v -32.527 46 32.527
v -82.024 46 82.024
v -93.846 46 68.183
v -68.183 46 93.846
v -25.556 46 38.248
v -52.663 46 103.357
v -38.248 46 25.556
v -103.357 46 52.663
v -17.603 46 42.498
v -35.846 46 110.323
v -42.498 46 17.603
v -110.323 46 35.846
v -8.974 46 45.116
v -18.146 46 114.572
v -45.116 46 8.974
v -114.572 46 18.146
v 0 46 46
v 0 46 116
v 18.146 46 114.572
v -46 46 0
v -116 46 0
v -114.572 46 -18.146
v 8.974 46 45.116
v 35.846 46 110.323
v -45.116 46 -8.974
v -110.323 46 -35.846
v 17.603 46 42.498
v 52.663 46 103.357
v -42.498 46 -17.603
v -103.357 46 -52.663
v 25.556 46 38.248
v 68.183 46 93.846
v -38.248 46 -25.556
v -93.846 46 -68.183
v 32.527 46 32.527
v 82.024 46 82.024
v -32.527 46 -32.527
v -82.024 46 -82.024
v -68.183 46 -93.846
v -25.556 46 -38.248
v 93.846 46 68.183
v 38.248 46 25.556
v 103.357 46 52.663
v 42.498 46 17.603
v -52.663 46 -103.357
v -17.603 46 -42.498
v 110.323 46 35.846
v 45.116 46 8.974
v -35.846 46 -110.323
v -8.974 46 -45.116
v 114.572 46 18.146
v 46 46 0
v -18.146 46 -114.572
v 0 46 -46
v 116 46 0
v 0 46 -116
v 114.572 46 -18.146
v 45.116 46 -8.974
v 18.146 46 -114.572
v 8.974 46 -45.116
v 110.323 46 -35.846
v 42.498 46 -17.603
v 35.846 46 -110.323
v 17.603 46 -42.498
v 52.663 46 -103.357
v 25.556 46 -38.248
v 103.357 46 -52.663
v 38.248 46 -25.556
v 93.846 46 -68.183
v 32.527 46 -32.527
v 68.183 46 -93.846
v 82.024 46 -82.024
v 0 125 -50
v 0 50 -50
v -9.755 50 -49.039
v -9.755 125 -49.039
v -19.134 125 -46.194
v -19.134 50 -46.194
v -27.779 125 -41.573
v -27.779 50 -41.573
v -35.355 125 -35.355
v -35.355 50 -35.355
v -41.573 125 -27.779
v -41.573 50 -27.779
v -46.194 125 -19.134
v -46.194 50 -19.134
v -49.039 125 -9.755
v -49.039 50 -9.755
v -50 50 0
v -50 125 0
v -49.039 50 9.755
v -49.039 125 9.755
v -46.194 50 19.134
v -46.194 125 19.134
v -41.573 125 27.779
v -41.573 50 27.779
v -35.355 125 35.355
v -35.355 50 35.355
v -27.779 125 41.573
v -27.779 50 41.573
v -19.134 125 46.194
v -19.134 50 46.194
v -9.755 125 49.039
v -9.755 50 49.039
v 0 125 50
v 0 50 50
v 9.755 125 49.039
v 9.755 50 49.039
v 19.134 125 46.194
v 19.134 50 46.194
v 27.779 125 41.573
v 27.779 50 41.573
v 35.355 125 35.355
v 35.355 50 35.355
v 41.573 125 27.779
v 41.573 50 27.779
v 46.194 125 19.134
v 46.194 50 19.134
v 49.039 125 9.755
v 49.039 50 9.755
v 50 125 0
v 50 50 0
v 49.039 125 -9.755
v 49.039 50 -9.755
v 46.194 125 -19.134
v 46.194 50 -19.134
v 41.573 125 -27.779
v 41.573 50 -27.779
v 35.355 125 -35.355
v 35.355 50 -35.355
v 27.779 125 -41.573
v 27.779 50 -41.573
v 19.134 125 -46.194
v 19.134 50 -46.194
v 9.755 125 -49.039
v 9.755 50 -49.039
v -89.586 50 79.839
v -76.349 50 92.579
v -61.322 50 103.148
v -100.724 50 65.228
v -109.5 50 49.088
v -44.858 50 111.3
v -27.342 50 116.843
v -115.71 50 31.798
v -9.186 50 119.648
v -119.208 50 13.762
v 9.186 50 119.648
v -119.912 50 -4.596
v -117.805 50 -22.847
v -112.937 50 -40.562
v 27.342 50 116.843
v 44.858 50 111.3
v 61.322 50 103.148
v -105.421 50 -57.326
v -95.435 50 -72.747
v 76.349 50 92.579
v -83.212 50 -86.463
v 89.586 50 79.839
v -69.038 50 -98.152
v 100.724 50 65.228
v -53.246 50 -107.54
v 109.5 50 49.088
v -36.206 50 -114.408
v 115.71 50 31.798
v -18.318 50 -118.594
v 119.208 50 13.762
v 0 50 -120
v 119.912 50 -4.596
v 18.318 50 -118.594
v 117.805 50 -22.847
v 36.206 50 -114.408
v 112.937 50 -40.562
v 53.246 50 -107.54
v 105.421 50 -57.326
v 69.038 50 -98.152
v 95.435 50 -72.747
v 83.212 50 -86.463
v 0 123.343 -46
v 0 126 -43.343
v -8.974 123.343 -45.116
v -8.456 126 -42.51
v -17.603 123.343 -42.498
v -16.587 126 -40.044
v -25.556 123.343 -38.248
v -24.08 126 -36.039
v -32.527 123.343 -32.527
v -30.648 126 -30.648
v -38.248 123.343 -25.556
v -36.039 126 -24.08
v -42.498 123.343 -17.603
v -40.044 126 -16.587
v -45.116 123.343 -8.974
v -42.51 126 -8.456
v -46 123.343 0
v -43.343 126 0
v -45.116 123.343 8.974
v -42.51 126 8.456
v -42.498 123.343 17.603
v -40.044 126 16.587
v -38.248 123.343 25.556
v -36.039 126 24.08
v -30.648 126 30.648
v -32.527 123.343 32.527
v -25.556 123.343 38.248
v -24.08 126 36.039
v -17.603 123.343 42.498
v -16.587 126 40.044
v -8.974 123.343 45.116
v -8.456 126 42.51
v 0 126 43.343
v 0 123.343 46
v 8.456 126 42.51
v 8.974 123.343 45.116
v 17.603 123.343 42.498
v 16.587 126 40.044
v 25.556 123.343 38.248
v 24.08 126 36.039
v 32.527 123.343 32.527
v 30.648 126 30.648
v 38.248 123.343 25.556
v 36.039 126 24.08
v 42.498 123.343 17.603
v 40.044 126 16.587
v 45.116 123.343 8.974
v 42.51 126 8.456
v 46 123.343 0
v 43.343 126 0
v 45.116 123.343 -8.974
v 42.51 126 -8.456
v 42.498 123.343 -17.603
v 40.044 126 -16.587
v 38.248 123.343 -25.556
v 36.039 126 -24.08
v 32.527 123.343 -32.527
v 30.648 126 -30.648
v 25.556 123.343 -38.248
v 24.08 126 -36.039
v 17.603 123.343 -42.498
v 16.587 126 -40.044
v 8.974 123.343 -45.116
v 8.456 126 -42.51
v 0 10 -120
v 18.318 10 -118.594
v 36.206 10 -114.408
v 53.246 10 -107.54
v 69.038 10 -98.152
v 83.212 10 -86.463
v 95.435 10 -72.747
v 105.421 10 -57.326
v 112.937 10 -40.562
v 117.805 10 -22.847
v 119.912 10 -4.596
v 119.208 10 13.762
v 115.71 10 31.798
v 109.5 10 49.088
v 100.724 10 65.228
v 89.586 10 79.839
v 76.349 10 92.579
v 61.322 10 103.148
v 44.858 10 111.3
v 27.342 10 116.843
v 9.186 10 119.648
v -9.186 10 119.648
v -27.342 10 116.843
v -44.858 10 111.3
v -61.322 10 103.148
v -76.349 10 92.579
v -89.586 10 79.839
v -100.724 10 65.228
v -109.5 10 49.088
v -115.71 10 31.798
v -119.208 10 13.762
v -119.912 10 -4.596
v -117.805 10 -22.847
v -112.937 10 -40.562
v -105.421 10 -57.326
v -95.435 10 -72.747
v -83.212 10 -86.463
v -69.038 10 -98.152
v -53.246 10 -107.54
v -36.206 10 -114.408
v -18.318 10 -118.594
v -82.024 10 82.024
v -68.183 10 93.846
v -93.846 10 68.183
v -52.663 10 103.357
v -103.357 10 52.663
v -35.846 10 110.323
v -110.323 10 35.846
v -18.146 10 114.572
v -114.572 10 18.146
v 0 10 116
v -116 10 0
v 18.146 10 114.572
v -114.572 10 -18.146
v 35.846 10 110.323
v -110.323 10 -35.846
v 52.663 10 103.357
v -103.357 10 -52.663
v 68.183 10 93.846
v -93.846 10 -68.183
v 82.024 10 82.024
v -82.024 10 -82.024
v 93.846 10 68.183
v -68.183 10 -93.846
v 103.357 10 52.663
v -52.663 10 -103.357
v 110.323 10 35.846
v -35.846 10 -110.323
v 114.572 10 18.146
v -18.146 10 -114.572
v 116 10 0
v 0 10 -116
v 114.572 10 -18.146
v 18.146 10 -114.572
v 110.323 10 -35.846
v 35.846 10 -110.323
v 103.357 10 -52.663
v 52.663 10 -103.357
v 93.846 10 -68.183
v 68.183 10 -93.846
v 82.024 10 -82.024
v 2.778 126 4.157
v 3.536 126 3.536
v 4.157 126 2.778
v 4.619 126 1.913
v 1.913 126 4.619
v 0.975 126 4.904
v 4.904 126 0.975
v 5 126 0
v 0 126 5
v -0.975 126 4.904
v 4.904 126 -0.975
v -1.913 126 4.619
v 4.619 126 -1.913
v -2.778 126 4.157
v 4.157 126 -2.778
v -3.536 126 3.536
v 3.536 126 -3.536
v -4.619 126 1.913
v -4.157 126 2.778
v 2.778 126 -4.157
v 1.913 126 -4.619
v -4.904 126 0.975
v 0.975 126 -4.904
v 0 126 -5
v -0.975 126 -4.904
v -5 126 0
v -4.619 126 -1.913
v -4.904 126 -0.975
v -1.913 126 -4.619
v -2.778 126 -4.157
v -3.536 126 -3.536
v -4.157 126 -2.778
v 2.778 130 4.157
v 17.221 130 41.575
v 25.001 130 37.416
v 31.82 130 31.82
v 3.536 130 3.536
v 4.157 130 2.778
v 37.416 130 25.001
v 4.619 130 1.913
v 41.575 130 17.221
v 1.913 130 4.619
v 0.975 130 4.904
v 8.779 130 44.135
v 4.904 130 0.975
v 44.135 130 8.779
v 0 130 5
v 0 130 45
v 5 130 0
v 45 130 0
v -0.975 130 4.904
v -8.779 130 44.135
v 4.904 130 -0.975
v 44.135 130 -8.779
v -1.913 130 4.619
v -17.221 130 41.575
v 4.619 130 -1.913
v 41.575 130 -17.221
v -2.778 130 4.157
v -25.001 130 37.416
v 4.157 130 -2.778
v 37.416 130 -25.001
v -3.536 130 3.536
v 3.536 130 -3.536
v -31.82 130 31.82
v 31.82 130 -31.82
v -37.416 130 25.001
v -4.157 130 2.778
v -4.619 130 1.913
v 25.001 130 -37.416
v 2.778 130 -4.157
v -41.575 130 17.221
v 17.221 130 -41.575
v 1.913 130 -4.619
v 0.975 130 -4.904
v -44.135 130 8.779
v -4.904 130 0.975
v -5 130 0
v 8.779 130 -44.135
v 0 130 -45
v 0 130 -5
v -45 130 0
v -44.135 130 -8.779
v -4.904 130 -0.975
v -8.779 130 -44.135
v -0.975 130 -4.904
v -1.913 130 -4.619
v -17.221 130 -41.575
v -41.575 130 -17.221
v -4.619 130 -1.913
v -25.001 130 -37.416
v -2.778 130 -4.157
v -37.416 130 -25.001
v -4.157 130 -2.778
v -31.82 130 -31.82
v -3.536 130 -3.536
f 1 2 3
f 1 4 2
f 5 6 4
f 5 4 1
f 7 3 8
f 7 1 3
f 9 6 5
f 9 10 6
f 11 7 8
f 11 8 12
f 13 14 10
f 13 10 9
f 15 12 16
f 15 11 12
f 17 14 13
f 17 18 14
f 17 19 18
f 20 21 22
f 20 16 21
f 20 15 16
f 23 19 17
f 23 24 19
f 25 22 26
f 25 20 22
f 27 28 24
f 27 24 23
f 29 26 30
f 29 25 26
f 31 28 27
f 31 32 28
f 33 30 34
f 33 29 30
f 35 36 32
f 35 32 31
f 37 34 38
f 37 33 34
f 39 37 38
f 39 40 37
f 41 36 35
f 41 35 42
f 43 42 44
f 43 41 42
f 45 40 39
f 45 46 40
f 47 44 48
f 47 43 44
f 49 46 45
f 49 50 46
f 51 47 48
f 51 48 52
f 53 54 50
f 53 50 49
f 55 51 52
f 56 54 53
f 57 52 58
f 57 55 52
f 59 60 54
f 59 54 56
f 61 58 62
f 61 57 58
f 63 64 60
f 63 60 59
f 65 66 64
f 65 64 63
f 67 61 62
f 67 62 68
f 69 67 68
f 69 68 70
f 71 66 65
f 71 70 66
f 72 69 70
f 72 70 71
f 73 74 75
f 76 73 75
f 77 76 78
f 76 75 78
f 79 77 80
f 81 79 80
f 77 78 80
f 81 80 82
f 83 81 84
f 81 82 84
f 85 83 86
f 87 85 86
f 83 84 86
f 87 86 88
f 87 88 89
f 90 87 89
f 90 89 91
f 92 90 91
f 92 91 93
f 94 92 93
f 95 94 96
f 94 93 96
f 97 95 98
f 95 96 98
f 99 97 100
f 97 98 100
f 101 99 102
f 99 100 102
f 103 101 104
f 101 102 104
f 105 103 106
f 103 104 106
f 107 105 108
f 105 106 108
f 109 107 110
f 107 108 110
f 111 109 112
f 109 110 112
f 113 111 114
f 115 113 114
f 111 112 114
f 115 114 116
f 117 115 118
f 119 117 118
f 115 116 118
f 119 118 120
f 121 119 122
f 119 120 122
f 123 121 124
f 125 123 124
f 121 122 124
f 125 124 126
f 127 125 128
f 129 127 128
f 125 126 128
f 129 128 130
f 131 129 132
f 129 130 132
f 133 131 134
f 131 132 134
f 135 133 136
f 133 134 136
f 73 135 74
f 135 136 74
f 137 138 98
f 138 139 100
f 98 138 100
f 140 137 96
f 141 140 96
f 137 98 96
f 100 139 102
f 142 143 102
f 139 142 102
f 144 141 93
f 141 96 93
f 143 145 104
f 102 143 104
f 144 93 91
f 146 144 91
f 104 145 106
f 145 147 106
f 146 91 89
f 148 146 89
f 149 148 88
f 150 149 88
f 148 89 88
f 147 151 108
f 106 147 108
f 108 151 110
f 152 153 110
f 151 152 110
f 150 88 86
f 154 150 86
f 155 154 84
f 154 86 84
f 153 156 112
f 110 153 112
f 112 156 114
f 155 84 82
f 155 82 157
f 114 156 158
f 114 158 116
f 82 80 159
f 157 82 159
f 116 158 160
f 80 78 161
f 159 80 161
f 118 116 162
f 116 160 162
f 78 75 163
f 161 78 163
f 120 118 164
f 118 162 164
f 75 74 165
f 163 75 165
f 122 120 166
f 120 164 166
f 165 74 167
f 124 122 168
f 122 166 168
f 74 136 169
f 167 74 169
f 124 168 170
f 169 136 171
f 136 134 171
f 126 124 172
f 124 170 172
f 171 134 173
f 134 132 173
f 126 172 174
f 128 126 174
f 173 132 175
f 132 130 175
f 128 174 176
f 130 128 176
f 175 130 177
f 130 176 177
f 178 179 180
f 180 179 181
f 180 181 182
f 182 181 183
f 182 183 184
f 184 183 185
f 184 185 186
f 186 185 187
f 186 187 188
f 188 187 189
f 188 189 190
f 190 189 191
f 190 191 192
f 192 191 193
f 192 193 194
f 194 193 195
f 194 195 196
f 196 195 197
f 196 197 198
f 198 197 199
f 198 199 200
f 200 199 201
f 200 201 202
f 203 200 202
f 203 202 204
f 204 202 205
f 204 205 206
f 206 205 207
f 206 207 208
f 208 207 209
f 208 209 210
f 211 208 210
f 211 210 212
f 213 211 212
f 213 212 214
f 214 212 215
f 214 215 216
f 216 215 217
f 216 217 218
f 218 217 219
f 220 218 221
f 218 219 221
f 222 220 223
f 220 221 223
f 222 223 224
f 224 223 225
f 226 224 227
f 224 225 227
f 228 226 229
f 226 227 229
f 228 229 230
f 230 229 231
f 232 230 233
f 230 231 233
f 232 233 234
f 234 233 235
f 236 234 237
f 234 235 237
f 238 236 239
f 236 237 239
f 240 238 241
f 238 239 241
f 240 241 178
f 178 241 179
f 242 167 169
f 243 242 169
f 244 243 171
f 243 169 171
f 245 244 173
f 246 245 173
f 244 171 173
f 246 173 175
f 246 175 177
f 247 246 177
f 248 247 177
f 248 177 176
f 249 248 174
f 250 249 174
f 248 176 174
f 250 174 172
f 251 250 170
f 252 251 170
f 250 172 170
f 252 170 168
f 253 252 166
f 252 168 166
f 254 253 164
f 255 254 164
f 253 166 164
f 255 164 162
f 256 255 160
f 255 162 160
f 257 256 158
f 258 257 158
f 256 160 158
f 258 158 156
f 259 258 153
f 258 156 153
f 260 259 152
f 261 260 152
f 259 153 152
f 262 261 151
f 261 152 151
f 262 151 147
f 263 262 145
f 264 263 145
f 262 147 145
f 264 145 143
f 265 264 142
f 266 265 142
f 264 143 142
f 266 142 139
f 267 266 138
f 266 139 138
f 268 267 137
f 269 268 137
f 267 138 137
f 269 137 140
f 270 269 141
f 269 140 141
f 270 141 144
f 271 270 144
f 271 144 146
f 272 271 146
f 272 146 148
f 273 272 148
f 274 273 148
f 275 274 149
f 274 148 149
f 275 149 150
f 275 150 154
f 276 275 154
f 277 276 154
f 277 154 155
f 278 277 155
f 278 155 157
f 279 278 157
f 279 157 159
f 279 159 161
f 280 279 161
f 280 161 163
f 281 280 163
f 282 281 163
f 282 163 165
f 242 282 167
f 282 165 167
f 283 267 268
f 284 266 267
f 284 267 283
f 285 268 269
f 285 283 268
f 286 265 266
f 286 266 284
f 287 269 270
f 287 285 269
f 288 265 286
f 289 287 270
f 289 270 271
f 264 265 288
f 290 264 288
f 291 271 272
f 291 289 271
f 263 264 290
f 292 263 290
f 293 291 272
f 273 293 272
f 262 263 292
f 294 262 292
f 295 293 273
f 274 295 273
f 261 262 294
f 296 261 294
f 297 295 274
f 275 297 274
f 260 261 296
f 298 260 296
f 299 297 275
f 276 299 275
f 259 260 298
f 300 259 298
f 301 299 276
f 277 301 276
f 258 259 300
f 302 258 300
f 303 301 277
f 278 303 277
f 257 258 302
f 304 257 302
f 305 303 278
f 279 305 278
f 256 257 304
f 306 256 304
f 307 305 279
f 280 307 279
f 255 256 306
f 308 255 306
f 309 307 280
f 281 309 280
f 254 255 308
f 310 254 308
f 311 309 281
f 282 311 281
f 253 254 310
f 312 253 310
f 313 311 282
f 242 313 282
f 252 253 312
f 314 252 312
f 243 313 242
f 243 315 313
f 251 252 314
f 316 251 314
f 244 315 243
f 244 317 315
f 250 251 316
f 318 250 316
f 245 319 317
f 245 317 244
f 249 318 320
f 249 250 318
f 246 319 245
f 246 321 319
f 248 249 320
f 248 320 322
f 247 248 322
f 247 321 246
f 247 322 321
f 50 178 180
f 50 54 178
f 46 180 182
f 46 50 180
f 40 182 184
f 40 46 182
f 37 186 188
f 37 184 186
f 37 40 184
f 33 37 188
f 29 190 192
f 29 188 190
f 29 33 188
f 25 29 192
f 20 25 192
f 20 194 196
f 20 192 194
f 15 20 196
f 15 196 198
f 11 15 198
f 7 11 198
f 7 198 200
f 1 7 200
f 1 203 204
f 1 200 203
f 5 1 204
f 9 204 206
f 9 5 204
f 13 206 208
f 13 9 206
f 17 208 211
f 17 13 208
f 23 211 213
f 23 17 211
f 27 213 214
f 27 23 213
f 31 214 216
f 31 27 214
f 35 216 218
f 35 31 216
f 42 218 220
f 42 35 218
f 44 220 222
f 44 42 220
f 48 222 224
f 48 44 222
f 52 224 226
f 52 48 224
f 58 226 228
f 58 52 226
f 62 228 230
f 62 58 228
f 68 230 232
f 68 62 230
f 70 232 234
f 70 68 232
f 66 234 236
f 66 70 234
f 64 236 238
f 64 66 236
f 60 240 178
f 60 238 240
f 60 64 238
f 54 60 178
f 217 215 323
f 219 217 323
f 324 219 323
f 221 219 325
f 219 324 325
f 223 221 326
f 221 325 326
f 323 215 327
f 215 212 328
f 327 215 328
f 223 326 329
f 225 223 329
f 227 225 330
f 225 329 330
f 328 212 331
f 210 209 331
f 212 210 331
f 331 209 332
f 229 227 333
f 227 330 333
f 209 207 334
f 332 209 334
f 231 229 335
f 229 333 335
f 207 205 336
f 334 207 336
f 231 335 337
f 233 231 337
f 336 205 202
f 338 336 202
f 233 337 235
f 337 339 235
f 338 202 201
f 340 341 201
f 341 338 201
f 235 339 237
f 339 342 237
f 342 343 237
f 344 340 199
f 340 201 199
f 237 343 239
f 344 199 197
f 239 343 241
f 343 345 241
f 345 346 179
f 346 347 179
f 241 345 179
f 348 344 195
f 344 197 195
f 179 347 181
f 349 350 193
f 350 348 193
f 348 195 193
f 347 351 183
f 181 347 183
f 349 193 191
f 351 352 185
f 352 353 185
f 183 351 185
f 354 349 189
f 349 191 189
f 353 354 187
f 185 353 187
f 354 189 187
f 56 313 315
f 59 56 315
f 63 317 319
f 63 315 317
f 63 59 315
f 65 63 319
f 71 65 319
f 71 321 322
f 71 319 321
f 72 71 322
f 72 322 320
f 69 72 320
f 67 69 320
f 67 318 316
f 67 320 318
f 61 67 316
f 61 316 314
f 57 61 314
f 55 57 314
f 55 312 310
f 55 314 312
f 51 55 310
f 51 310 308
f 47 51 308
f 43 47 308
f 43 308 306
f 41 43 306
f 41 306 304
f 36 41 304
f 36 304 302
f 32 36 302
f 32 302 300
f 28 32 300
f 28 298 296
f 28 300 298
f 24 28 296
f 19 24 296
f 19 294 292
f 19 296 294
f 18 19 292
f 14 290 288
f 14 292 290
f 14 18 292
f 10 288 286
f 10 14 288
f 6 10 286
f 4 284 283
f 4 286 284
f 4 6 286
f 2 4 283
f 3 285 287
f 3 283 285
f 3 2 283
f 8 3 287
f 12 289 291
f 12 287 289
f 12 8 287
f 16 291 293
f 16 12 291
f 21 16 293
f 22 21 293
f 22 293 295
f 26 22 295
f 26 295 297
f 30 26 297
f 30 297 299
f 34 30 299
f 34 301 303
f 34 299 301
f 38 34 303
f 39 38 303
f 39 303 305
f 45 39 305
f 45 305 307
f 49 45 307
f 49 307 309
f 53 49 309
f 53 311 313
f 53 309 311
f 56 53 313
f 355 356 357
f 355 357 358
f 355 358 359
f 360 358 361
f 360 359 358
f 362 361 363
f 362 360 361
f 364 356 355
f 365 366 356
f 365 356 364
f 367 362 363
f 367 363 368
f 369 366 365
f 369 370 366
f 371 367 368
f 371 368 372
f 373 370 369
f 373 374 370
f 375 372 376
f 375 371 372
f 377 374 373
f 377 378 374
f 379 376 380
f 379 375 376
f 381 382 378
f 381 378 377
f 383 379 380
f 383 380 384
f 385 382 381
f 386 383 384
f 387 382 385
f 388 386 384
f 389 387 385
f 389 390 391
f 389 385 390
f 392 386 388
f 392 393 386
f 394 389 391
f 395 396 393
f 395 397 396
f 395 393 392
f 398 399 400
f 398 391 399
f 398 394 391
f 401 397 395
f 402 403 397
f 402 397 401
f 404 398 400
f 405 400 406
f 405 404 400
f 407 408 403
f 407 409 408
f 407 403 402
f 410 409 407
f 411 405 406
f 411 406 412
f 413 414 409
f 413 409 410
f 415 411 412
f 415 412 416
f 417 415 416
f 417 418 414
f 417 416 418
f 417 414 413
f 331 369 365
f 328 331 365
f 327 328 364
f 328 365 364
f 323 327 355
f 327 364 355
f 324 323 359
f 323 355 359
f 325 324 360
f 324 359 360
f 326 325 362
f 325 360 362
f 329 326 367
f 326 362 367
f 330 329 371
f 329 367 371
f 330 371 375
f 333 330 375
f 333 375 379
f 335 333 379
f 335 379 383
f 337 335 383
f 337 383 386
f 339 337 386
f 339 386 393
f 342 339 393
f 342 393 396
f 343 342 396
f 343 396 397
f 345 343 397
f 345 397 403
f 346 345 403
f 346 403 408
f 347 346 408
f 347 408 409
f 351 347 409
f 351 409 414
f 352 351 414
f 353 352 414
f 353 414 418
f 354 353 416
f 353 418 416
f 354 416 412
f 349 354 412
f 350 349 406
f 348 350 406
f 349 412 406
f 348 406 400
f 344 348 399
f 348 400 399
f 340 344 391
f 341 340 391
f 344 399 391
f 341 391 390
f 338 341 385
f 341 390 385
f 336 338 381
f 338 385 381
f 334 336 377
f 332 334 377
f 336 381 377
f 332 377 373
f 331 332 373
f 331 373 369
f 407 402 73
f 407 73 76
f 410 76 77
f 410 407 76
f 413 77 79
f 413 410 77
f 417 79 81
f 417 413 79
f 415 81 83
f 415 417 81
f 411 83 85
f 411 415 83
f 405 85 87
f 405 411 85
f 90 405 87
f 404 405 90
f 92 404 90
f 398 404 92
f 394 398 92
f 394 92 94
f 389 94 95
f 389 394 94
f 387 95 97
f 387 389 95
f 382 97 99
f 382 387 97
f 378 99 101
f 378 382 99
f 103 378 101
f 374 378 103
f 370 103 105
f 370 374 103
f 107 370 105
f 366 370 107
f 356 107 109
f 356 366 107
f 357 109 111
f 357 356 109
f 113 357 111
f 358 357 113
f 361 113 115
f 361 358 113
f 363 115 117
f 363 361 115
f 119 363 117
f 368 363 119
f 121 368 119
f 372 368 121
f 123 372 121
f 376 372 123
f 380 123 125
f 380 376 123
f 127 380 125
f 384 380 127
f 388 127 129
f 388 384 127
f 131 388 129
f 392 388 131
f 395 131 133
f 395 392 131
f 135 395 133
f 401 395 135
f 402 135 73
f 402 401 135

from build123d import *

# Parameters (mm, degrees)
BOSS_EXTRUDE1_DEPTH = 100
SKETCH3_R           = 50
BOSS_EXTRUDE3_DEPTH = 80
CHAMFER1_SIZE       = 5
FILLET1_R           = 1
SKETCH4_R           = 5
CUT_EXTRUDE1_DEPTH  = 20
SKETCH5_R           = 15
SKETCH5_R_2         = 2.5
SKETCH5_W           = 60
SKETCH5_H           = 10
SKETCH5_W_2         = 50
CUT_EXTRUDE2_DEPTH  = 20
SKETCH6_W           = 150
SKETCH6_H           = 200
CUT_EXTRUDE3_DEPTH  = 181
SKETCH7_R           = 120
BOSS_EXTRUDE4_DEPTH = 40
SHELL1_T            = -4
SKETCH10_R          = 5
CUT_EXTRUDE4_DEPTH  = 209


with BuildPart() as part:
    # Sketch2 → Boss-Extrude1 (new, symmetric)
    with BuildSketch(Plane.XY):
        with BuildLine():
            Line((-75, 50), (-70, 50))
            ThreePointArc((-70, 50), (-65, 45), (-60, 50))
            Line((-60, 50), (-35, 50))
            Line((-35, 50), (-25, 50))
            Line((-25, 50), (25, 50))
            Line((25, 50), (35, 50))
            Line((35, 50), (60, 50))
            ThreePointArc((60, 50), (65, 45), (70, 50))
            Line((70, 50), (75, 50))
            Line((75, 50), (75, 15))
            ThreePointArc((75, 15), (70.980762114, 0), (75, -15))
            Line((75, -15), (75, -50))
            Line((75, -50), (70, -50))
            ThreePointArc((70, -50), (65, -45), (60, -50))
            Line((60, -50), (35, -50))
            ThreePointArc((35, -50), (30, -45), (25, -50))
            Line((25, -50), (-25, -50))
            ThreePointArc((-25, -50), (-30, -45), (-35, -50))
            Line((-35, -50), (-60, -50))
            ThreePointArc((-60, -50), (-65, -45), (-70, -50))
            Line((-70, -50), (-75, -50))
            Line((-75, -50), (-75, -15))
            ThreePointArc((-75, -15), (-70.980762114, 0), (-75, 15))
            Line((-75, 15), (-75, 50))
        make_face()
    extrude(amount=BOSS_EXTRUDE1_DEPTH, both=True)

    # Sketch3 → Boss-Extrude3 (add)
    with BuildSketch(Plane(origin=(0, 50, 0), x_dir=(1, 0, 0), z_dir=(0, 1, 0))):
        with Locations(Location((0, 0, 0), (0, 0, 90))):
            Circle(SKETCH3_R)
    extrude(amount=BOSS_EXTRUDE3_DEPTH)

    # Chamfer1
    chamfer1_edges = [part.edges().sort_by_distance(p)[0] for p in [
        (0, 130, 50),
    ]]
    chamfer(chamfer1_edges, length=CHAMFER1_SIZE)

    # Fillet1
    fillet1_edges = [part.edges().sort_by_distance(p)[0] for p in [
        (-75, -50, 0),
        (-75, 50, 0),
        (75, 50, 0),
        (75, -50, 0),
    ]]
    fillet(fillet1_edges, radius=FILLET1_R)

    # Sketch4 → Cut-Extrude1 (cut)
    with BuildSketch(Plane.XZ.offset(50)):
        with Locations(Location((-47.5, 80, 0), (0, 0, 270))):
            Circle(SKETCH4_R)
        with Locations(Location((47.5, 80, 0), (0, 0, 270))):
            Circle(SKETCH4_R)
        with Locations(Location((47.5, 40, 0), (0, 0, 270))):
            Circle(SKETCH4_R)
        with Locations(Location((47.5, 0, 0), (0, 0, 270))):
            Circle(SKETCH4_R)
        with Locations(Location((47.5, -40, 0), (0, 0, 270))):
            Circle(SKETCH4_R)
        with Locations(Location((47.5, -80, 0), (0, 0, 270))):
            Circle(SKETCH4_R)
        with Locations(Location((-47.5, 40, 0), (0, 0, 270))):
            Circle(SKETCH4_R)
        with Locations(Location((-47.5, 0, 0), (0, 0, 270))):
            Circle(SKETCH4_R)
        with Locations(Location((-47.5, -40, 0), (0, 0, 270))):
            Circle(SKETCH4_R)
        with Locations(Location((-47.5, -80, 0), (0, 0, 270))):
            Circle(SKETCH4_R)
    extrude(amount=-CUT_EXTRUDE1_DEPTH, mode=Mode.SUBTRACT)

    # Sketch5 → Cut-Extrude2 (cut)
    with BuildSketch(Plane(origin=(0, 0, -100), x_dir=(-1, 0, 0), z_dir=(0, 0, -1))):
        with Locations((40, 25)):
            Circle(SKETCH5_R)
        with Locations((35, 25)):
            Circle(SKETCH5_R_2, mode=Mode.SUBTRACT)
        with Locations((45, 25)):
            Circle(SKETCH5_R_2, mode=Mode.SUBTRACT)
        with Locations((-25, -20)):
            Rectangle(SKETCH5_W, SKETCH5_H)
        with Locations((-25, 10)):
            Rectangle(SKETCH5_W_2, SKETCH5_H)
    extrude(amount=-CUT_EXTRUDE2_DEPTH, mode=Mode.SUBTRACT)

    # Sketch6 → Cut-Extrude3 (cut)
    with BuildSketch(Plane(origin=(0, 50, 0), x_dir=(1, 0, 0), z_dir=(0, 1, 0))):
        Rectangle(SKETCH6_W, SKETCH6_H)
    extrude(amount=-CUT_EXTRUDE3_DEPTH, mode=Mode.SUBTRACT)

    # Sketch7 → Boss-Extrude4 (add)
    with BuildSketch(Plane.XZ.offset(-50)):
        with Locations(Location((0, 0, 0), (0, 0, 270))):
            Circle(SKETCH7_R)
    extrude(amount=BOSS_EXTRUDE4_DEPTH)

    # Shell1
    shell1_openings = [part.faces().sort_by_distance(p)[0] for p in [
        (0, 10, 0),
    ]]
    offset(amount=SHELL1_T, openings=shell1_openings, kind=Kind.INTERSECTION)

    # Sketch10 → Cut-Extrude4 (cut)
    with BuildSketch(Plane(origin=(0, 130, 0), x_dir=(1, 0, 0), z_dir=(0, 1, 0))):
        with Locations(Location((0, 0, 0), (0, 0, 270))):
            Circle(SKETCH10_R)
    extrude(amount=-CUT_EXTRUDE4_DEPTH, mode=Mode.SUBTRACT)


solid = part.part
